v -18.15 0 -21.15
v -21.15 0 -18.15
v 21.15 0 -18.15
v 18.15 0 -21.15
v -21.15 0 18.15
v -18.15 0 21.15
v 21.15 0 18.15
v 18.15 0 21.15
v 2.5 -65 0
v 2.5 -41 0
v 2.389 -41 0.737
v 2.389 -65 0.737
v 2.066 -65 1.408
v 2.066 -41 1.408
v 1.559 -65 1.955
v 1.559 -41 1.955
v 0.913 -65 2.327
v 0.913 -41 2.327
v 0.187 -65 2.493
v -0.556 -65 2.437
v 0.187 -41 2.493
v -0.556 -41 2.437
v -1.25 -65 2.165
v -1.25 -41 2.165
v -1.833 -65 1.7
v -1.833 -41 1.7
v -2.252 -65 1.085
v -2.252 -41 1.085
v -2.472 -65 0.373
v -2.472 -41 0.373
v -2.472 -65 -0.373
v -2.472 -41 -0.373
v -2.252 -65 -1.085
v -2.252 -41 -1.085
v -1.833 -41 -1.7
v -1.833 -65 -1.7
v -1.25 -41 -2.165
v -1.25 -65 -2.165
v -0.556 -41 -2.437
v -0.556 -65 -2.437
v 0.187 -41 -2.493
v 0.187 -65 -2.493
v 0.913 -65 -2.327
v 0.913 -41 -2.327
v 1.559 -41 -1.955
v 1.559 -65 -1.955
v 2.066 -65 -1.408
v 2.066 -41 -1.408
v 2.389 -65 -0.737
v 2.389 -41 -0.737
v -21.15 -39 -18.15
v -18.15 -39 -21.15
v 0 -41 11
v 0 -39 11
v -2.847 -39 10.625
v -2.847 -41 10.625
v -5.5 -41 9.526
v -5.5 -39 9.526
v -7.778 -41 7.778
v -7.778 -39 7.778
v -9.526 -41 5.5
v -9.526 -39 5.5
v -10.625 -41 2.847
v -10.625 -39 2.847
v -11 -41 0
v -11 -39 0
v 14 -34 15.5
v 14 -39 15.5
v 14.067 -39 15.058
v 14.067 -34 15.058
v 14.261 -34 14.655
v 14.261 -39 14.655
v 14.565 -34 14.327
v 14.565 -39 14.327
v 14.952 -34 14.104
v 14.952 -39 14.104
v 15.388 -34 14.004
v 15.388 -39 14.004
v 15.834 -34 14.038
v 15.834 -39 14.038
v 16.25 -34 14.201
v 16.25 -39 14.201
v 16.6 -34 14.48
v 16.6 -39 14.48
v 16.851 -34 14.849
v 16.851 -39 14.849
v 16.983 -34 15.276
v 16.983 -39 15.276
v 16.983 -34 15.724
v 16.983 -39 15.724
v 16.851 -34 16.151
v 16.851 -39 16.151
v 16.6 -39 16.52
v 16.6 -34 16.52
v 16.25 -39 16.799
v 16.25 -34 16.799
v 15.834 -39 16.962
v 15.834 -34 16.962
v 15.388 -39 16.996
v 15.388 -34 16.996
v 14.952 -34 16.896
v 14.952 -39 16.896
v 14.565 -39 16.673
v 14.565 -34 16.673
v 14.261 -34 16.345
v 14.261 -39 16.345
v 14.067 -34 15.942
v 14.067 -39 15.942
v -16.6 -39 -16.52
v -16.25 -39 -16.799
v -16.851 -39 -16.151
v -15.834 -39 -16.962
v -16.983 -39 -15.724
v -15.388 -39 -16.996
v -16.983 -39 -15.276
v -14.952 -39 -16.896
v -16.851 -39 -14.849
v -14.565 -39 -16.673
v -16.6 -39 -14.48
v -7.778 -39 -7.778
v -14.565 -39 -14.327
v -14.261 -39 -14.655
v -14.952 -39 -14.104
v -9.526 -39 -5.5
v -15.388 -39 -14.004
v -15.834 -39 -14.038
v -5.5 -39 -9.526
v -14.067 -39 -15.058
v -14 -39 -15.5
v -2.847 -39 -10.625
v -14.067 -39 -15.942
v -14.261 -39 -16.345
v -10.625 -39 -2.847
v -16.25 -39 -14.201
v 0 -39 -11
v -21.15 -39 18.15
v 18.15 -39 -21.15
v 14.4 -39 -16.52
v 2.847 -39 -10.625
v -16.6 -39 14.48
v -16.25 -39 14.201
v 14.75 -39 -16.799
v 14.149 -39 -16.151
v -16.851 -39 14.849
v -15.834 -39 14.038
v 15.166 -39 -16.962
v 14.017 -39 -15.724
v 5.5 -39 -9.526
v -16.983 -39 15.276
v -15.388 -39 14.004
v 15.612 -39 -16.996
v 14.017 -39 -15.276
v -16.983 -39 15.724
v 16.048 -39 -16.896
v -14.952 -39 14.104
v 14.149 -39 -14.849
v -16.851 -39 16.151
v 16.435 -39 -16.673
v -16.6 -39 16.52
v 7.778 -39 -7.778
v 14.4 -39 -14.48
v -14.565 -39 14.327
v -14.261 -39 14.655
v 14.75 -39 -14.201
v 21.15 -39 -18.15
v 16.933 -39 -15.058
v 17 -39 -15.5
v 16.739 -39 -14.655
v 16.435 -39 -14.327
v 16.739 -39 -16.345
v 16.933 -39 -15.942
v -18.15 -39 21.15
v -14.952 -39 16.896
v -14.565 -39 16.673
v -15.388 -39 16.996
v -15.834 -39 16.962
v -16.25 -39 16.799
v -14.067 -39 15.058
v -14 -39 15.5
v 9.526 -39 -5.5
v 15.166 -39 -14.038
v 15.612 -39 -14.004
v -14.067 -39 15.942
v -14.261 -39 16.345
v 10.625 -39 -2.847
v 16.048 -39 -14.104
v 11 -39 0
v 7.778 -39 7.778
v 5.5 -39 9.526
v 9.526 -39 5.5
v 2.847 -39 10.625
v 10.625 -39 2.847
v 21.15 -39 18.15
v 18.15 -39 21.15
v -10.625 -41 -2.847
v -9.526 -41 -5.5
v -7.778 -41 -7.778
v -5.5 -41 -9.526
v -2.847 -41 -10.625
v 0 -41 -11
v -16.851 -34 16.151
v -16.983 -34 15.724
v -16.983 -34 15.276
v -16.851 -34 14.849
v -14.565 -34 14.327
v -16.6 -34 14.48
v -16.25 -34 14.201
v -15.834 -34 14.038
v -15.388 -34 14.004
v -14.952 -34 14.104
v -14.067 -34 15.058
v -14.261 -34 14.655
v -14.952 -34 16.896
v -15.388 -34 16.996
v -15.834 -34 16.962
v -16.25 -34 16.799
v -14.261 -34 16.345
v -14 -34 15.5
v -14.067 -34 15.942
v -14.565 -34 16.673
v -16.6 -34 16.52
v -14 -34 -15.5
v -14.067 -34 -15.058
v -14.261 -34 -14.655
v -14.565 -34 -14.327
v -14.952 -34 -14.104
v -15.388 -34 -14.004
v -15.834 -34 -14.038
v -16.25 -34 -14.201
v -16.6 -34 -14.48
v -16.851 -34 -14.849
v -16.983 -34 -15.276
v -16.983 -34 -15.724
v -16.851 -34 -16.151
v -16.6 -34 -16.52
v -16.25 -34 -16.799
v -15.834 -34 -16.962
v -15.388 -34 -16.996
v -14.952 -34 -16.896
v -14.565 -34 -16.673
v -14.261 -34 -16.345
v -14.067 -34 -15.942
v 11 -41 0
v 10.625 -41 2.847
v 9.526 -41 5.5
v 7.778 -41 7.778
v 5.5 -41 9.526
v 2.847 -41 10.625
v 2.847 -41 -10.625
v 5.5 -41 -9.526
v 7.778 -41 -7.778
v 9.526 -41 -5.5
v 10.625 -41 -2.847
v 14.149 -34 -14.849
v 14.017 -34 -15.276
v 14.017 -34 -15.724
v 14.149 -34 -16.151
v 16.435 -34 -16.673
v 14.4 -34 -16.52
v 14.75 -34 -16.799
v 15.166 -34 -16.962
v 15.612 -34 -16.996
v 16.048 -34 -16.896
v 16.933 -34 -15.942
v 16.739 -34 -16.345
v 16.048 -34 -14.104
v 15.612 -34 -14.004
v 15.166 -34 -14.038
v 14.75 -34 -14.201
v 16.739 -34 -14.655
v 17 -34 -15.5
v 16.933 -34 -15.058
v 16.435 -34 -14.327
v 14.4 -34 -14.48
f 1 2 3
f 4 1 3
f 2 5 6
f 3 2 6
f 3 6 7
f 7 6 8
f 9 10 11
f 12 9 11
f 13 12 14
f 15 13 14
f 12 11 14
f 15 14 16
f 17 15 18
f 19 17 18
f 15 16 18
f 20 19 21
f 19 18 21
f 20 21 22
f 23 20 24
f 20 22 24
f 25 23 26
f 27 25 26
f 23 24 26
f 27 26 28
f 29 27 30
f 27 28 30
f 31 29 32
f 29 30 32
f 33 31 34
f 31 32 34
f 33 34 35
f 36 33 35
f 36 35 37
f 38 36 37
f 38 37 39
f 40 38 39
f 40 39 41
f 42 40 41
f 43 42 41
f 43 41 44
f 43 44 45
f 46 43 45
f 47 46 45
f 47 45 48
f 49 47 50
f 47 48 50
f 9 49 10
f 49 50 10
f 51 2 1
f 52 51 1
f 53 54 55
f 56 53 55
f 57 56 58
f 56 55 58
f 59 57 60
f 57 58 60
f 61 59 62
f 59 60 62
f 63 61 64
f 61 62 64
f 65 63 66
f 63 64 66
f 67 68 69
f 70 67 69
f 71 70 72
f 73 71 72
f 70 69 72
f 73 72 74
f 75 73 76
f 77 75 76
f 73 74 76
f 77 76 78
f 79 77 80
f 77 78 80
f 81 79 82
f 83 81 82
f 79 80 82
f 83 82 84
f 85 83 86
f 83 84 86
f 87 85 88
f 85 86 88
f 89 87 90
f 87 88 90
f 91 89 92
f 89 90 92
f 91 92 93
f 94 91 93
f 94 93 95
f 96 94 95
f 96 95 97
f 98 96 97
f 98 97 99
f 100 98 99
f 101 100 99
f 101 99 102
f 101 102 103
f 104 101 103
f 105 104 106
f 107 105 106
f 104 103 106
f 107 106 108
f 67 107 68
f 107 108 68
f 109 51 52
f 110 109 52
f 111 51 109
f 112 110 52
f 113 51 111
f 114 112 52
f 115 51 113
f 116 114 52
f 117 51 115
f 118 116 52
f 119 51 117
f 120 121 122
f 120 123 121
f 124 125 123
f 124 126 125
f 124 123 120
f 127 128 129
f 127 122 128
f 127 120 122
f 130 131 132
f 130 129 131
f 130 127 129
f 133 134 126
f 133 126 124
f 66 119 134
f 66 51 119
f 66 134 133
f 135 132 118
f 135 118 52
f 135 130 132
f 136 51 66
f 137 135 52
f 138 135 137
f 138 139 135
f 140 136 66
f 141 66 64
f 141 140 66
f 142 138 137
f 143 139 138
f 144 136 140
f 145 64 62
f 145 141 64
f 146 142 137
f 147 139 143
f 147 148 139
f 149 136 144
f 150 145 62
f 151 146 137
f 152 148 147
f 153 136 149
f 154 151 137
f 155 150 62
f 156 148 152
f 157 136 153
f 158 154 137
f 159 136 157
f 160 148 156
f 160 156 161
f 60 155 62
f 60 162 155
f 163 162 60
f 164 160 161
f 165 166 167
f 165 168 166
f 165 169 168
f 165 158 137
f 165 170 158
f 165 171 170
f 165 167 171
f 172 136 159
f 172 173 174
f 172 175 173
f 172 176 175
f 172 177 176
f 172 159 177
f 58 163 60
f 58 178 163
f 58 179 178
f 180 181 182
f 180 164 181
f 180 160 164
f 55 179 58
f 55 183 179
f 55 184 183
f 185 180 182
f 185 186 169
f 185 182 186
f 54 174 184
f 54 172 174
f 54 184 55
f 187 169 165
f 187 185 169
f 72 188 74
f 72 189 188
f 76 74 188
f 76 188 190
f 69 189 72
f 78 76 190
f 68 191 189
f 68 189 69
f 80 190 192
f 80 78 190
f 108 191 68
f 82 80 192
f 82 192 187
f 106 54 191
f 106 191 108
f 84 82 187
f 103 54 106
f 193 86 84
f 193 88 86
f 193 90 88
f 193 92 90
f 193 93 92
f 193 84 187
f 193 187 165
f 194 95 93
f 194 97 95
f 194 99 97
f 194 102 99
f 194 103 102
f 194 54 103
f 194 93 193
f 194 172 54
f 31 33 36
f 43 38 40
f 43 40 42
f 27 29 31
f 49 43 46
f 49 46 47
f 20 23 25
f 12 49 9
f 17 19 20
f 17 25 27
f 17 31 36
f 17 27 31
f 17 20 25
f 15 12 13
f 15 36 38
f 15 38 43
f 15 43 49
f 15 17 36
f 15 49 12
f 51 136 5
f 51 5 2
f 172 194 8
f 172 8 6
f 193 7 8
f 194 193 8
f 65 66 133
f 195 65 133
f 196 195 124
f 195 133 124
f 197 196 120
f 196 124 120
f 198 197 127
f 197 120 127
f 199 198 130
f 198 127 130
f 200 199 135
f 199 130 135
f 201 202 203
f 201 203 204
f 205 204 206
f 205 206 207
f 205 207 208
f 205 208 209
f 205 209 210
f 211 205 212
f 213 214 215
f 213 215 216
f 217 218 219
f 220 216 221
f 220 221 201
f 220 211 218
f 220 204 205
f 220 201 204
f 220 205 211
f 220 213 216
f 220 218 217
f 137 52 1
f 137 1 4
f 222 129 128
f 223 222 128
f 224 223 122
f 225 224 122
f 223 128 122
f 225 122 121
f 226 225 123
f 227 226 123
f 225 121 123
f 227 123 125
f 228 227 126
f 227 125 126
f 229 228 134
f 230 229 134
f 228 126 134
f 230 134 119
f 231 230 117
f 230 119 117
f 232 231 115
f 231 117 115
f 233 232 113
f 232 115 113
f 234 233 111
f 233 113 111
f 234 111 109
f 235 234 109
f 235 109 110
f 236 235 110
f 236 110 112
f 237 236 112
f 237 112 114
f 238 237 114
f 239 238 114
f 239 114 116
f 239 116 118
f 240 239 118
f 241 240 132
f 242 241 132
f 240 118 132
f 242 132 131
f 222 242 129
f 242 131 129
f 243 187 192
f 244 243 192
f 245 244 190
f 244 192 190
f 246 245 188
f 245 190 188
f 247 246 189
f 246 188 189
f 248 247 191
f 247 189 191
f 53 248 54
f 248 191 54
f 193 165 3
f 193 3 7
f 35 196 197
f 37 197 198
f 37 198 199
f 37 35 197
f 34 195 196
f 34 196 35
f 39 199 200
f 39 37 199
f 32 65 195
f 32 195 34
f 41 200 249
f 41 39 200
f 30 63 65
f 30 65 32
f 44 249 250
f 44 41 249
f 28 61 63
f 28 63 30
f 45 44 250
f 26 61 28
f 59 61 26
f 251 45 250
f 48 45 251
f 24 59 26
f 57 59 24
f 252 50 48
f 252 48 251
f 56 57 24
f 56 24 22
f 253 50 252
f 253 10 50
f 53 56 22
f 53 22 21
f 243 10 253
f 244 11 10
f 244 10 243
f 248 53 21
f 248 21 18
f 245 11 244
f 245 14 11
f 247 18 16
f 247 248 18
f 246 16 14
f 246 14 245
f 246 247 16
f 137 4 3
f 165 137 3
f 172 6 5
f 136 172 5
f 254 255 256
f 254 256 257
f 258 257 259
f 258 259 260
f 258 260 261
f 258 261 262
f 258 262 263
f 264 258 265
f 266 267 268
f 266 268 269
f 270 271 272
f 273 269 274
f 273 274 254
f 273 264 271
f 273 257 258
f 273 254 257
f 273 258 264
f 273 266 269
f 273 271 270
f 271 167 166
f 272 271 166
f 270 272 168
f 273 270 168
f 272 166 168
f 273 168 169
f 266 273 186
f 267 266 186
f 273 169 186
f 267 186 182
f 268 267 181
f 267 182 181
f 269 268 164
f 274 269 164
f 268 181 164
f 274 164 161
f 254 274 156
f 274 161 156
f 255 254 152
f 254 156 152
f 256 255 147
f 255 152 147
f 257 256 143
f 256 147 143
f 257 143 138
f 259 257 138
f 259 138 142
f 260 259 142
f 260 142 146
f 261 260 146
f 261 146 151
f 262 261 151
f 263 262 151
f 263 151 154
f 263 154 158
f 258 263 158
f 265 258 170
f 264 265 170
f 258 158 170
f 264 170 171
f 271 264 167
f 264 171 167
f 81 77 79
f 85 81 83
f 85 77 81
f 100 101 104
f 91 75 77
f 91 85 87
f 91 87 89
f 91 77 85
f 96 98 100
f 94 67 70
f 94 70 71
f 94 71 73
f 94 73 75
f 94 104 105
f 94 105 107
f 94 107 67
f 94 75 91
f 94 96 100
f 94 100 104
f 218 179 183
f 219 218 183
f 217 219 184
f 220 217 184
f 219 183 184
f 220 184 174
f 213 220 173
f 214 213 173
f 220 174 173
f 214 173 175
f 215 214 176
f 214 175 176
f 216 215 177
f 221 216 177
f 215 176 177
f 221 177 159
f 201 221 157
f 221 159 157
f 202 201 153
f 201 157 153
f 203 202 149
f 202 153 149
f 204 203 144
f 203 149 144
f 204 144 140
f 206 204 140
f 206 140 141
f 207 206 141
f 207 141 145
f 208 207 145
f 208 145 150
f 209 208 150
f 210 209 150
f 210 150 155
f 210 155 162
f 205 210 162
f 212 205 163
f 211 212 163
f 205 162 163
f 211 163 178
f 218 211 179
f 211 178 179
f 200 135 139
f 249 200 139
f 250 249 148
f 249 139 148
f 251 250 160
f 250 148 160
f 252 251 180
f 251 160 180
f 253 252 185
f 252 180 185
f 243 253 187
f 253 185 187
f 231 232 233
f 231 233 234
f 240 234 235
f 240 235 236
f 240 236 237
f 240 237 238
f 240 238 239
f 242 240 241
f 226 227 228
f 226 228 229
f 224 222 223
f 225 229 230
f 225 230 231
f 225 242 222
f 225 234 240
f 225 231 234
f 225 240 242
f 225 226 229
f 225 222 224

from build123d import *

# Parameters (mm, degrees)
F1_DEPTH = 39
F3_DEPTH = 2
F4_R     = 2.5
F5_DEPTH = 24
F6_R     = 1.5
F7_DEPTH = 5


with BuildPart() as f1:
    # F0 (on Front) → F1 (new body)
    with BuildSketch(Plane.XZ):
        Polygon((21.15, 18.15), (18.15, 21.15), (-18.15, 21.15), (-21.15, 18.15), (-21.15, -18.15), (-18.15, -21.15), (18.15, -21.15), (21.15, -18.15), align=None)
    extrude(amount=F1_DEPTH)

    # F2 (on face) → F3 (join)
    with BuildSketch(Plane.XZ.offset(39)):
        with BuildLine():
            ThreePointArc((-11, 0), (-7.7781745931, -7.7781745931), (0, -11))
            Line((0, -11), (0, 0))
            Line((0, 0), (-11, 0))
        make_face()
        with BuildLine():
            Line((0, 0), (0, 11))
            ThreePointArc((0, 11), (-7.7781745931, 7.7781745931), (-11, 0))
            Line((-11, 0), (0, 0))
        make_face()
        with BuildLine():
            Line((0, 0), (11, 0))
            ThreePointArc((11, 0), (7.7781745931, 7.7781745931), (0, 11))
            Line((0, 11), (0, 0))
        make_face()
        with BuildLine():
            ThreePointArc((0, -11), (7.7781745931, -7.7781745931), (11, 0))
            Line((11, 0), (0, 0))
            Line((0, 0), (0, -11))
        make_face()
    extrude(amount=F3_DEPTH)

    # F4 (on face) → F5 (join)
    with BuildSketch(Plane.XZ.offset(41)):
        Circle(F4_R)
    extrude(amount=F5_DEPTH)

    # F6 (on face) → F7 (cut)
    with BuildSketch(Plane.XZ.offset(39)):
        with Locations((-15.5, 15.5)):
            Circle(F6_R)
        with BuildLine():
            ThreePointArc((17, 15.5), (15.5, 17), (14, 15.5))
            ThreePointArc((14, 15.5), (15.5, 14), (17, 15.5))
        make_face()
        with Locations((15.5, -15.5)):
            Circle(F6_R)
        with Locations((-15.5, -15.5)):
            Circle(F6_R)
    extrude(amount=-F7_DEPTH, mode=Mode.SUBTRACT)


solid = f1.part
